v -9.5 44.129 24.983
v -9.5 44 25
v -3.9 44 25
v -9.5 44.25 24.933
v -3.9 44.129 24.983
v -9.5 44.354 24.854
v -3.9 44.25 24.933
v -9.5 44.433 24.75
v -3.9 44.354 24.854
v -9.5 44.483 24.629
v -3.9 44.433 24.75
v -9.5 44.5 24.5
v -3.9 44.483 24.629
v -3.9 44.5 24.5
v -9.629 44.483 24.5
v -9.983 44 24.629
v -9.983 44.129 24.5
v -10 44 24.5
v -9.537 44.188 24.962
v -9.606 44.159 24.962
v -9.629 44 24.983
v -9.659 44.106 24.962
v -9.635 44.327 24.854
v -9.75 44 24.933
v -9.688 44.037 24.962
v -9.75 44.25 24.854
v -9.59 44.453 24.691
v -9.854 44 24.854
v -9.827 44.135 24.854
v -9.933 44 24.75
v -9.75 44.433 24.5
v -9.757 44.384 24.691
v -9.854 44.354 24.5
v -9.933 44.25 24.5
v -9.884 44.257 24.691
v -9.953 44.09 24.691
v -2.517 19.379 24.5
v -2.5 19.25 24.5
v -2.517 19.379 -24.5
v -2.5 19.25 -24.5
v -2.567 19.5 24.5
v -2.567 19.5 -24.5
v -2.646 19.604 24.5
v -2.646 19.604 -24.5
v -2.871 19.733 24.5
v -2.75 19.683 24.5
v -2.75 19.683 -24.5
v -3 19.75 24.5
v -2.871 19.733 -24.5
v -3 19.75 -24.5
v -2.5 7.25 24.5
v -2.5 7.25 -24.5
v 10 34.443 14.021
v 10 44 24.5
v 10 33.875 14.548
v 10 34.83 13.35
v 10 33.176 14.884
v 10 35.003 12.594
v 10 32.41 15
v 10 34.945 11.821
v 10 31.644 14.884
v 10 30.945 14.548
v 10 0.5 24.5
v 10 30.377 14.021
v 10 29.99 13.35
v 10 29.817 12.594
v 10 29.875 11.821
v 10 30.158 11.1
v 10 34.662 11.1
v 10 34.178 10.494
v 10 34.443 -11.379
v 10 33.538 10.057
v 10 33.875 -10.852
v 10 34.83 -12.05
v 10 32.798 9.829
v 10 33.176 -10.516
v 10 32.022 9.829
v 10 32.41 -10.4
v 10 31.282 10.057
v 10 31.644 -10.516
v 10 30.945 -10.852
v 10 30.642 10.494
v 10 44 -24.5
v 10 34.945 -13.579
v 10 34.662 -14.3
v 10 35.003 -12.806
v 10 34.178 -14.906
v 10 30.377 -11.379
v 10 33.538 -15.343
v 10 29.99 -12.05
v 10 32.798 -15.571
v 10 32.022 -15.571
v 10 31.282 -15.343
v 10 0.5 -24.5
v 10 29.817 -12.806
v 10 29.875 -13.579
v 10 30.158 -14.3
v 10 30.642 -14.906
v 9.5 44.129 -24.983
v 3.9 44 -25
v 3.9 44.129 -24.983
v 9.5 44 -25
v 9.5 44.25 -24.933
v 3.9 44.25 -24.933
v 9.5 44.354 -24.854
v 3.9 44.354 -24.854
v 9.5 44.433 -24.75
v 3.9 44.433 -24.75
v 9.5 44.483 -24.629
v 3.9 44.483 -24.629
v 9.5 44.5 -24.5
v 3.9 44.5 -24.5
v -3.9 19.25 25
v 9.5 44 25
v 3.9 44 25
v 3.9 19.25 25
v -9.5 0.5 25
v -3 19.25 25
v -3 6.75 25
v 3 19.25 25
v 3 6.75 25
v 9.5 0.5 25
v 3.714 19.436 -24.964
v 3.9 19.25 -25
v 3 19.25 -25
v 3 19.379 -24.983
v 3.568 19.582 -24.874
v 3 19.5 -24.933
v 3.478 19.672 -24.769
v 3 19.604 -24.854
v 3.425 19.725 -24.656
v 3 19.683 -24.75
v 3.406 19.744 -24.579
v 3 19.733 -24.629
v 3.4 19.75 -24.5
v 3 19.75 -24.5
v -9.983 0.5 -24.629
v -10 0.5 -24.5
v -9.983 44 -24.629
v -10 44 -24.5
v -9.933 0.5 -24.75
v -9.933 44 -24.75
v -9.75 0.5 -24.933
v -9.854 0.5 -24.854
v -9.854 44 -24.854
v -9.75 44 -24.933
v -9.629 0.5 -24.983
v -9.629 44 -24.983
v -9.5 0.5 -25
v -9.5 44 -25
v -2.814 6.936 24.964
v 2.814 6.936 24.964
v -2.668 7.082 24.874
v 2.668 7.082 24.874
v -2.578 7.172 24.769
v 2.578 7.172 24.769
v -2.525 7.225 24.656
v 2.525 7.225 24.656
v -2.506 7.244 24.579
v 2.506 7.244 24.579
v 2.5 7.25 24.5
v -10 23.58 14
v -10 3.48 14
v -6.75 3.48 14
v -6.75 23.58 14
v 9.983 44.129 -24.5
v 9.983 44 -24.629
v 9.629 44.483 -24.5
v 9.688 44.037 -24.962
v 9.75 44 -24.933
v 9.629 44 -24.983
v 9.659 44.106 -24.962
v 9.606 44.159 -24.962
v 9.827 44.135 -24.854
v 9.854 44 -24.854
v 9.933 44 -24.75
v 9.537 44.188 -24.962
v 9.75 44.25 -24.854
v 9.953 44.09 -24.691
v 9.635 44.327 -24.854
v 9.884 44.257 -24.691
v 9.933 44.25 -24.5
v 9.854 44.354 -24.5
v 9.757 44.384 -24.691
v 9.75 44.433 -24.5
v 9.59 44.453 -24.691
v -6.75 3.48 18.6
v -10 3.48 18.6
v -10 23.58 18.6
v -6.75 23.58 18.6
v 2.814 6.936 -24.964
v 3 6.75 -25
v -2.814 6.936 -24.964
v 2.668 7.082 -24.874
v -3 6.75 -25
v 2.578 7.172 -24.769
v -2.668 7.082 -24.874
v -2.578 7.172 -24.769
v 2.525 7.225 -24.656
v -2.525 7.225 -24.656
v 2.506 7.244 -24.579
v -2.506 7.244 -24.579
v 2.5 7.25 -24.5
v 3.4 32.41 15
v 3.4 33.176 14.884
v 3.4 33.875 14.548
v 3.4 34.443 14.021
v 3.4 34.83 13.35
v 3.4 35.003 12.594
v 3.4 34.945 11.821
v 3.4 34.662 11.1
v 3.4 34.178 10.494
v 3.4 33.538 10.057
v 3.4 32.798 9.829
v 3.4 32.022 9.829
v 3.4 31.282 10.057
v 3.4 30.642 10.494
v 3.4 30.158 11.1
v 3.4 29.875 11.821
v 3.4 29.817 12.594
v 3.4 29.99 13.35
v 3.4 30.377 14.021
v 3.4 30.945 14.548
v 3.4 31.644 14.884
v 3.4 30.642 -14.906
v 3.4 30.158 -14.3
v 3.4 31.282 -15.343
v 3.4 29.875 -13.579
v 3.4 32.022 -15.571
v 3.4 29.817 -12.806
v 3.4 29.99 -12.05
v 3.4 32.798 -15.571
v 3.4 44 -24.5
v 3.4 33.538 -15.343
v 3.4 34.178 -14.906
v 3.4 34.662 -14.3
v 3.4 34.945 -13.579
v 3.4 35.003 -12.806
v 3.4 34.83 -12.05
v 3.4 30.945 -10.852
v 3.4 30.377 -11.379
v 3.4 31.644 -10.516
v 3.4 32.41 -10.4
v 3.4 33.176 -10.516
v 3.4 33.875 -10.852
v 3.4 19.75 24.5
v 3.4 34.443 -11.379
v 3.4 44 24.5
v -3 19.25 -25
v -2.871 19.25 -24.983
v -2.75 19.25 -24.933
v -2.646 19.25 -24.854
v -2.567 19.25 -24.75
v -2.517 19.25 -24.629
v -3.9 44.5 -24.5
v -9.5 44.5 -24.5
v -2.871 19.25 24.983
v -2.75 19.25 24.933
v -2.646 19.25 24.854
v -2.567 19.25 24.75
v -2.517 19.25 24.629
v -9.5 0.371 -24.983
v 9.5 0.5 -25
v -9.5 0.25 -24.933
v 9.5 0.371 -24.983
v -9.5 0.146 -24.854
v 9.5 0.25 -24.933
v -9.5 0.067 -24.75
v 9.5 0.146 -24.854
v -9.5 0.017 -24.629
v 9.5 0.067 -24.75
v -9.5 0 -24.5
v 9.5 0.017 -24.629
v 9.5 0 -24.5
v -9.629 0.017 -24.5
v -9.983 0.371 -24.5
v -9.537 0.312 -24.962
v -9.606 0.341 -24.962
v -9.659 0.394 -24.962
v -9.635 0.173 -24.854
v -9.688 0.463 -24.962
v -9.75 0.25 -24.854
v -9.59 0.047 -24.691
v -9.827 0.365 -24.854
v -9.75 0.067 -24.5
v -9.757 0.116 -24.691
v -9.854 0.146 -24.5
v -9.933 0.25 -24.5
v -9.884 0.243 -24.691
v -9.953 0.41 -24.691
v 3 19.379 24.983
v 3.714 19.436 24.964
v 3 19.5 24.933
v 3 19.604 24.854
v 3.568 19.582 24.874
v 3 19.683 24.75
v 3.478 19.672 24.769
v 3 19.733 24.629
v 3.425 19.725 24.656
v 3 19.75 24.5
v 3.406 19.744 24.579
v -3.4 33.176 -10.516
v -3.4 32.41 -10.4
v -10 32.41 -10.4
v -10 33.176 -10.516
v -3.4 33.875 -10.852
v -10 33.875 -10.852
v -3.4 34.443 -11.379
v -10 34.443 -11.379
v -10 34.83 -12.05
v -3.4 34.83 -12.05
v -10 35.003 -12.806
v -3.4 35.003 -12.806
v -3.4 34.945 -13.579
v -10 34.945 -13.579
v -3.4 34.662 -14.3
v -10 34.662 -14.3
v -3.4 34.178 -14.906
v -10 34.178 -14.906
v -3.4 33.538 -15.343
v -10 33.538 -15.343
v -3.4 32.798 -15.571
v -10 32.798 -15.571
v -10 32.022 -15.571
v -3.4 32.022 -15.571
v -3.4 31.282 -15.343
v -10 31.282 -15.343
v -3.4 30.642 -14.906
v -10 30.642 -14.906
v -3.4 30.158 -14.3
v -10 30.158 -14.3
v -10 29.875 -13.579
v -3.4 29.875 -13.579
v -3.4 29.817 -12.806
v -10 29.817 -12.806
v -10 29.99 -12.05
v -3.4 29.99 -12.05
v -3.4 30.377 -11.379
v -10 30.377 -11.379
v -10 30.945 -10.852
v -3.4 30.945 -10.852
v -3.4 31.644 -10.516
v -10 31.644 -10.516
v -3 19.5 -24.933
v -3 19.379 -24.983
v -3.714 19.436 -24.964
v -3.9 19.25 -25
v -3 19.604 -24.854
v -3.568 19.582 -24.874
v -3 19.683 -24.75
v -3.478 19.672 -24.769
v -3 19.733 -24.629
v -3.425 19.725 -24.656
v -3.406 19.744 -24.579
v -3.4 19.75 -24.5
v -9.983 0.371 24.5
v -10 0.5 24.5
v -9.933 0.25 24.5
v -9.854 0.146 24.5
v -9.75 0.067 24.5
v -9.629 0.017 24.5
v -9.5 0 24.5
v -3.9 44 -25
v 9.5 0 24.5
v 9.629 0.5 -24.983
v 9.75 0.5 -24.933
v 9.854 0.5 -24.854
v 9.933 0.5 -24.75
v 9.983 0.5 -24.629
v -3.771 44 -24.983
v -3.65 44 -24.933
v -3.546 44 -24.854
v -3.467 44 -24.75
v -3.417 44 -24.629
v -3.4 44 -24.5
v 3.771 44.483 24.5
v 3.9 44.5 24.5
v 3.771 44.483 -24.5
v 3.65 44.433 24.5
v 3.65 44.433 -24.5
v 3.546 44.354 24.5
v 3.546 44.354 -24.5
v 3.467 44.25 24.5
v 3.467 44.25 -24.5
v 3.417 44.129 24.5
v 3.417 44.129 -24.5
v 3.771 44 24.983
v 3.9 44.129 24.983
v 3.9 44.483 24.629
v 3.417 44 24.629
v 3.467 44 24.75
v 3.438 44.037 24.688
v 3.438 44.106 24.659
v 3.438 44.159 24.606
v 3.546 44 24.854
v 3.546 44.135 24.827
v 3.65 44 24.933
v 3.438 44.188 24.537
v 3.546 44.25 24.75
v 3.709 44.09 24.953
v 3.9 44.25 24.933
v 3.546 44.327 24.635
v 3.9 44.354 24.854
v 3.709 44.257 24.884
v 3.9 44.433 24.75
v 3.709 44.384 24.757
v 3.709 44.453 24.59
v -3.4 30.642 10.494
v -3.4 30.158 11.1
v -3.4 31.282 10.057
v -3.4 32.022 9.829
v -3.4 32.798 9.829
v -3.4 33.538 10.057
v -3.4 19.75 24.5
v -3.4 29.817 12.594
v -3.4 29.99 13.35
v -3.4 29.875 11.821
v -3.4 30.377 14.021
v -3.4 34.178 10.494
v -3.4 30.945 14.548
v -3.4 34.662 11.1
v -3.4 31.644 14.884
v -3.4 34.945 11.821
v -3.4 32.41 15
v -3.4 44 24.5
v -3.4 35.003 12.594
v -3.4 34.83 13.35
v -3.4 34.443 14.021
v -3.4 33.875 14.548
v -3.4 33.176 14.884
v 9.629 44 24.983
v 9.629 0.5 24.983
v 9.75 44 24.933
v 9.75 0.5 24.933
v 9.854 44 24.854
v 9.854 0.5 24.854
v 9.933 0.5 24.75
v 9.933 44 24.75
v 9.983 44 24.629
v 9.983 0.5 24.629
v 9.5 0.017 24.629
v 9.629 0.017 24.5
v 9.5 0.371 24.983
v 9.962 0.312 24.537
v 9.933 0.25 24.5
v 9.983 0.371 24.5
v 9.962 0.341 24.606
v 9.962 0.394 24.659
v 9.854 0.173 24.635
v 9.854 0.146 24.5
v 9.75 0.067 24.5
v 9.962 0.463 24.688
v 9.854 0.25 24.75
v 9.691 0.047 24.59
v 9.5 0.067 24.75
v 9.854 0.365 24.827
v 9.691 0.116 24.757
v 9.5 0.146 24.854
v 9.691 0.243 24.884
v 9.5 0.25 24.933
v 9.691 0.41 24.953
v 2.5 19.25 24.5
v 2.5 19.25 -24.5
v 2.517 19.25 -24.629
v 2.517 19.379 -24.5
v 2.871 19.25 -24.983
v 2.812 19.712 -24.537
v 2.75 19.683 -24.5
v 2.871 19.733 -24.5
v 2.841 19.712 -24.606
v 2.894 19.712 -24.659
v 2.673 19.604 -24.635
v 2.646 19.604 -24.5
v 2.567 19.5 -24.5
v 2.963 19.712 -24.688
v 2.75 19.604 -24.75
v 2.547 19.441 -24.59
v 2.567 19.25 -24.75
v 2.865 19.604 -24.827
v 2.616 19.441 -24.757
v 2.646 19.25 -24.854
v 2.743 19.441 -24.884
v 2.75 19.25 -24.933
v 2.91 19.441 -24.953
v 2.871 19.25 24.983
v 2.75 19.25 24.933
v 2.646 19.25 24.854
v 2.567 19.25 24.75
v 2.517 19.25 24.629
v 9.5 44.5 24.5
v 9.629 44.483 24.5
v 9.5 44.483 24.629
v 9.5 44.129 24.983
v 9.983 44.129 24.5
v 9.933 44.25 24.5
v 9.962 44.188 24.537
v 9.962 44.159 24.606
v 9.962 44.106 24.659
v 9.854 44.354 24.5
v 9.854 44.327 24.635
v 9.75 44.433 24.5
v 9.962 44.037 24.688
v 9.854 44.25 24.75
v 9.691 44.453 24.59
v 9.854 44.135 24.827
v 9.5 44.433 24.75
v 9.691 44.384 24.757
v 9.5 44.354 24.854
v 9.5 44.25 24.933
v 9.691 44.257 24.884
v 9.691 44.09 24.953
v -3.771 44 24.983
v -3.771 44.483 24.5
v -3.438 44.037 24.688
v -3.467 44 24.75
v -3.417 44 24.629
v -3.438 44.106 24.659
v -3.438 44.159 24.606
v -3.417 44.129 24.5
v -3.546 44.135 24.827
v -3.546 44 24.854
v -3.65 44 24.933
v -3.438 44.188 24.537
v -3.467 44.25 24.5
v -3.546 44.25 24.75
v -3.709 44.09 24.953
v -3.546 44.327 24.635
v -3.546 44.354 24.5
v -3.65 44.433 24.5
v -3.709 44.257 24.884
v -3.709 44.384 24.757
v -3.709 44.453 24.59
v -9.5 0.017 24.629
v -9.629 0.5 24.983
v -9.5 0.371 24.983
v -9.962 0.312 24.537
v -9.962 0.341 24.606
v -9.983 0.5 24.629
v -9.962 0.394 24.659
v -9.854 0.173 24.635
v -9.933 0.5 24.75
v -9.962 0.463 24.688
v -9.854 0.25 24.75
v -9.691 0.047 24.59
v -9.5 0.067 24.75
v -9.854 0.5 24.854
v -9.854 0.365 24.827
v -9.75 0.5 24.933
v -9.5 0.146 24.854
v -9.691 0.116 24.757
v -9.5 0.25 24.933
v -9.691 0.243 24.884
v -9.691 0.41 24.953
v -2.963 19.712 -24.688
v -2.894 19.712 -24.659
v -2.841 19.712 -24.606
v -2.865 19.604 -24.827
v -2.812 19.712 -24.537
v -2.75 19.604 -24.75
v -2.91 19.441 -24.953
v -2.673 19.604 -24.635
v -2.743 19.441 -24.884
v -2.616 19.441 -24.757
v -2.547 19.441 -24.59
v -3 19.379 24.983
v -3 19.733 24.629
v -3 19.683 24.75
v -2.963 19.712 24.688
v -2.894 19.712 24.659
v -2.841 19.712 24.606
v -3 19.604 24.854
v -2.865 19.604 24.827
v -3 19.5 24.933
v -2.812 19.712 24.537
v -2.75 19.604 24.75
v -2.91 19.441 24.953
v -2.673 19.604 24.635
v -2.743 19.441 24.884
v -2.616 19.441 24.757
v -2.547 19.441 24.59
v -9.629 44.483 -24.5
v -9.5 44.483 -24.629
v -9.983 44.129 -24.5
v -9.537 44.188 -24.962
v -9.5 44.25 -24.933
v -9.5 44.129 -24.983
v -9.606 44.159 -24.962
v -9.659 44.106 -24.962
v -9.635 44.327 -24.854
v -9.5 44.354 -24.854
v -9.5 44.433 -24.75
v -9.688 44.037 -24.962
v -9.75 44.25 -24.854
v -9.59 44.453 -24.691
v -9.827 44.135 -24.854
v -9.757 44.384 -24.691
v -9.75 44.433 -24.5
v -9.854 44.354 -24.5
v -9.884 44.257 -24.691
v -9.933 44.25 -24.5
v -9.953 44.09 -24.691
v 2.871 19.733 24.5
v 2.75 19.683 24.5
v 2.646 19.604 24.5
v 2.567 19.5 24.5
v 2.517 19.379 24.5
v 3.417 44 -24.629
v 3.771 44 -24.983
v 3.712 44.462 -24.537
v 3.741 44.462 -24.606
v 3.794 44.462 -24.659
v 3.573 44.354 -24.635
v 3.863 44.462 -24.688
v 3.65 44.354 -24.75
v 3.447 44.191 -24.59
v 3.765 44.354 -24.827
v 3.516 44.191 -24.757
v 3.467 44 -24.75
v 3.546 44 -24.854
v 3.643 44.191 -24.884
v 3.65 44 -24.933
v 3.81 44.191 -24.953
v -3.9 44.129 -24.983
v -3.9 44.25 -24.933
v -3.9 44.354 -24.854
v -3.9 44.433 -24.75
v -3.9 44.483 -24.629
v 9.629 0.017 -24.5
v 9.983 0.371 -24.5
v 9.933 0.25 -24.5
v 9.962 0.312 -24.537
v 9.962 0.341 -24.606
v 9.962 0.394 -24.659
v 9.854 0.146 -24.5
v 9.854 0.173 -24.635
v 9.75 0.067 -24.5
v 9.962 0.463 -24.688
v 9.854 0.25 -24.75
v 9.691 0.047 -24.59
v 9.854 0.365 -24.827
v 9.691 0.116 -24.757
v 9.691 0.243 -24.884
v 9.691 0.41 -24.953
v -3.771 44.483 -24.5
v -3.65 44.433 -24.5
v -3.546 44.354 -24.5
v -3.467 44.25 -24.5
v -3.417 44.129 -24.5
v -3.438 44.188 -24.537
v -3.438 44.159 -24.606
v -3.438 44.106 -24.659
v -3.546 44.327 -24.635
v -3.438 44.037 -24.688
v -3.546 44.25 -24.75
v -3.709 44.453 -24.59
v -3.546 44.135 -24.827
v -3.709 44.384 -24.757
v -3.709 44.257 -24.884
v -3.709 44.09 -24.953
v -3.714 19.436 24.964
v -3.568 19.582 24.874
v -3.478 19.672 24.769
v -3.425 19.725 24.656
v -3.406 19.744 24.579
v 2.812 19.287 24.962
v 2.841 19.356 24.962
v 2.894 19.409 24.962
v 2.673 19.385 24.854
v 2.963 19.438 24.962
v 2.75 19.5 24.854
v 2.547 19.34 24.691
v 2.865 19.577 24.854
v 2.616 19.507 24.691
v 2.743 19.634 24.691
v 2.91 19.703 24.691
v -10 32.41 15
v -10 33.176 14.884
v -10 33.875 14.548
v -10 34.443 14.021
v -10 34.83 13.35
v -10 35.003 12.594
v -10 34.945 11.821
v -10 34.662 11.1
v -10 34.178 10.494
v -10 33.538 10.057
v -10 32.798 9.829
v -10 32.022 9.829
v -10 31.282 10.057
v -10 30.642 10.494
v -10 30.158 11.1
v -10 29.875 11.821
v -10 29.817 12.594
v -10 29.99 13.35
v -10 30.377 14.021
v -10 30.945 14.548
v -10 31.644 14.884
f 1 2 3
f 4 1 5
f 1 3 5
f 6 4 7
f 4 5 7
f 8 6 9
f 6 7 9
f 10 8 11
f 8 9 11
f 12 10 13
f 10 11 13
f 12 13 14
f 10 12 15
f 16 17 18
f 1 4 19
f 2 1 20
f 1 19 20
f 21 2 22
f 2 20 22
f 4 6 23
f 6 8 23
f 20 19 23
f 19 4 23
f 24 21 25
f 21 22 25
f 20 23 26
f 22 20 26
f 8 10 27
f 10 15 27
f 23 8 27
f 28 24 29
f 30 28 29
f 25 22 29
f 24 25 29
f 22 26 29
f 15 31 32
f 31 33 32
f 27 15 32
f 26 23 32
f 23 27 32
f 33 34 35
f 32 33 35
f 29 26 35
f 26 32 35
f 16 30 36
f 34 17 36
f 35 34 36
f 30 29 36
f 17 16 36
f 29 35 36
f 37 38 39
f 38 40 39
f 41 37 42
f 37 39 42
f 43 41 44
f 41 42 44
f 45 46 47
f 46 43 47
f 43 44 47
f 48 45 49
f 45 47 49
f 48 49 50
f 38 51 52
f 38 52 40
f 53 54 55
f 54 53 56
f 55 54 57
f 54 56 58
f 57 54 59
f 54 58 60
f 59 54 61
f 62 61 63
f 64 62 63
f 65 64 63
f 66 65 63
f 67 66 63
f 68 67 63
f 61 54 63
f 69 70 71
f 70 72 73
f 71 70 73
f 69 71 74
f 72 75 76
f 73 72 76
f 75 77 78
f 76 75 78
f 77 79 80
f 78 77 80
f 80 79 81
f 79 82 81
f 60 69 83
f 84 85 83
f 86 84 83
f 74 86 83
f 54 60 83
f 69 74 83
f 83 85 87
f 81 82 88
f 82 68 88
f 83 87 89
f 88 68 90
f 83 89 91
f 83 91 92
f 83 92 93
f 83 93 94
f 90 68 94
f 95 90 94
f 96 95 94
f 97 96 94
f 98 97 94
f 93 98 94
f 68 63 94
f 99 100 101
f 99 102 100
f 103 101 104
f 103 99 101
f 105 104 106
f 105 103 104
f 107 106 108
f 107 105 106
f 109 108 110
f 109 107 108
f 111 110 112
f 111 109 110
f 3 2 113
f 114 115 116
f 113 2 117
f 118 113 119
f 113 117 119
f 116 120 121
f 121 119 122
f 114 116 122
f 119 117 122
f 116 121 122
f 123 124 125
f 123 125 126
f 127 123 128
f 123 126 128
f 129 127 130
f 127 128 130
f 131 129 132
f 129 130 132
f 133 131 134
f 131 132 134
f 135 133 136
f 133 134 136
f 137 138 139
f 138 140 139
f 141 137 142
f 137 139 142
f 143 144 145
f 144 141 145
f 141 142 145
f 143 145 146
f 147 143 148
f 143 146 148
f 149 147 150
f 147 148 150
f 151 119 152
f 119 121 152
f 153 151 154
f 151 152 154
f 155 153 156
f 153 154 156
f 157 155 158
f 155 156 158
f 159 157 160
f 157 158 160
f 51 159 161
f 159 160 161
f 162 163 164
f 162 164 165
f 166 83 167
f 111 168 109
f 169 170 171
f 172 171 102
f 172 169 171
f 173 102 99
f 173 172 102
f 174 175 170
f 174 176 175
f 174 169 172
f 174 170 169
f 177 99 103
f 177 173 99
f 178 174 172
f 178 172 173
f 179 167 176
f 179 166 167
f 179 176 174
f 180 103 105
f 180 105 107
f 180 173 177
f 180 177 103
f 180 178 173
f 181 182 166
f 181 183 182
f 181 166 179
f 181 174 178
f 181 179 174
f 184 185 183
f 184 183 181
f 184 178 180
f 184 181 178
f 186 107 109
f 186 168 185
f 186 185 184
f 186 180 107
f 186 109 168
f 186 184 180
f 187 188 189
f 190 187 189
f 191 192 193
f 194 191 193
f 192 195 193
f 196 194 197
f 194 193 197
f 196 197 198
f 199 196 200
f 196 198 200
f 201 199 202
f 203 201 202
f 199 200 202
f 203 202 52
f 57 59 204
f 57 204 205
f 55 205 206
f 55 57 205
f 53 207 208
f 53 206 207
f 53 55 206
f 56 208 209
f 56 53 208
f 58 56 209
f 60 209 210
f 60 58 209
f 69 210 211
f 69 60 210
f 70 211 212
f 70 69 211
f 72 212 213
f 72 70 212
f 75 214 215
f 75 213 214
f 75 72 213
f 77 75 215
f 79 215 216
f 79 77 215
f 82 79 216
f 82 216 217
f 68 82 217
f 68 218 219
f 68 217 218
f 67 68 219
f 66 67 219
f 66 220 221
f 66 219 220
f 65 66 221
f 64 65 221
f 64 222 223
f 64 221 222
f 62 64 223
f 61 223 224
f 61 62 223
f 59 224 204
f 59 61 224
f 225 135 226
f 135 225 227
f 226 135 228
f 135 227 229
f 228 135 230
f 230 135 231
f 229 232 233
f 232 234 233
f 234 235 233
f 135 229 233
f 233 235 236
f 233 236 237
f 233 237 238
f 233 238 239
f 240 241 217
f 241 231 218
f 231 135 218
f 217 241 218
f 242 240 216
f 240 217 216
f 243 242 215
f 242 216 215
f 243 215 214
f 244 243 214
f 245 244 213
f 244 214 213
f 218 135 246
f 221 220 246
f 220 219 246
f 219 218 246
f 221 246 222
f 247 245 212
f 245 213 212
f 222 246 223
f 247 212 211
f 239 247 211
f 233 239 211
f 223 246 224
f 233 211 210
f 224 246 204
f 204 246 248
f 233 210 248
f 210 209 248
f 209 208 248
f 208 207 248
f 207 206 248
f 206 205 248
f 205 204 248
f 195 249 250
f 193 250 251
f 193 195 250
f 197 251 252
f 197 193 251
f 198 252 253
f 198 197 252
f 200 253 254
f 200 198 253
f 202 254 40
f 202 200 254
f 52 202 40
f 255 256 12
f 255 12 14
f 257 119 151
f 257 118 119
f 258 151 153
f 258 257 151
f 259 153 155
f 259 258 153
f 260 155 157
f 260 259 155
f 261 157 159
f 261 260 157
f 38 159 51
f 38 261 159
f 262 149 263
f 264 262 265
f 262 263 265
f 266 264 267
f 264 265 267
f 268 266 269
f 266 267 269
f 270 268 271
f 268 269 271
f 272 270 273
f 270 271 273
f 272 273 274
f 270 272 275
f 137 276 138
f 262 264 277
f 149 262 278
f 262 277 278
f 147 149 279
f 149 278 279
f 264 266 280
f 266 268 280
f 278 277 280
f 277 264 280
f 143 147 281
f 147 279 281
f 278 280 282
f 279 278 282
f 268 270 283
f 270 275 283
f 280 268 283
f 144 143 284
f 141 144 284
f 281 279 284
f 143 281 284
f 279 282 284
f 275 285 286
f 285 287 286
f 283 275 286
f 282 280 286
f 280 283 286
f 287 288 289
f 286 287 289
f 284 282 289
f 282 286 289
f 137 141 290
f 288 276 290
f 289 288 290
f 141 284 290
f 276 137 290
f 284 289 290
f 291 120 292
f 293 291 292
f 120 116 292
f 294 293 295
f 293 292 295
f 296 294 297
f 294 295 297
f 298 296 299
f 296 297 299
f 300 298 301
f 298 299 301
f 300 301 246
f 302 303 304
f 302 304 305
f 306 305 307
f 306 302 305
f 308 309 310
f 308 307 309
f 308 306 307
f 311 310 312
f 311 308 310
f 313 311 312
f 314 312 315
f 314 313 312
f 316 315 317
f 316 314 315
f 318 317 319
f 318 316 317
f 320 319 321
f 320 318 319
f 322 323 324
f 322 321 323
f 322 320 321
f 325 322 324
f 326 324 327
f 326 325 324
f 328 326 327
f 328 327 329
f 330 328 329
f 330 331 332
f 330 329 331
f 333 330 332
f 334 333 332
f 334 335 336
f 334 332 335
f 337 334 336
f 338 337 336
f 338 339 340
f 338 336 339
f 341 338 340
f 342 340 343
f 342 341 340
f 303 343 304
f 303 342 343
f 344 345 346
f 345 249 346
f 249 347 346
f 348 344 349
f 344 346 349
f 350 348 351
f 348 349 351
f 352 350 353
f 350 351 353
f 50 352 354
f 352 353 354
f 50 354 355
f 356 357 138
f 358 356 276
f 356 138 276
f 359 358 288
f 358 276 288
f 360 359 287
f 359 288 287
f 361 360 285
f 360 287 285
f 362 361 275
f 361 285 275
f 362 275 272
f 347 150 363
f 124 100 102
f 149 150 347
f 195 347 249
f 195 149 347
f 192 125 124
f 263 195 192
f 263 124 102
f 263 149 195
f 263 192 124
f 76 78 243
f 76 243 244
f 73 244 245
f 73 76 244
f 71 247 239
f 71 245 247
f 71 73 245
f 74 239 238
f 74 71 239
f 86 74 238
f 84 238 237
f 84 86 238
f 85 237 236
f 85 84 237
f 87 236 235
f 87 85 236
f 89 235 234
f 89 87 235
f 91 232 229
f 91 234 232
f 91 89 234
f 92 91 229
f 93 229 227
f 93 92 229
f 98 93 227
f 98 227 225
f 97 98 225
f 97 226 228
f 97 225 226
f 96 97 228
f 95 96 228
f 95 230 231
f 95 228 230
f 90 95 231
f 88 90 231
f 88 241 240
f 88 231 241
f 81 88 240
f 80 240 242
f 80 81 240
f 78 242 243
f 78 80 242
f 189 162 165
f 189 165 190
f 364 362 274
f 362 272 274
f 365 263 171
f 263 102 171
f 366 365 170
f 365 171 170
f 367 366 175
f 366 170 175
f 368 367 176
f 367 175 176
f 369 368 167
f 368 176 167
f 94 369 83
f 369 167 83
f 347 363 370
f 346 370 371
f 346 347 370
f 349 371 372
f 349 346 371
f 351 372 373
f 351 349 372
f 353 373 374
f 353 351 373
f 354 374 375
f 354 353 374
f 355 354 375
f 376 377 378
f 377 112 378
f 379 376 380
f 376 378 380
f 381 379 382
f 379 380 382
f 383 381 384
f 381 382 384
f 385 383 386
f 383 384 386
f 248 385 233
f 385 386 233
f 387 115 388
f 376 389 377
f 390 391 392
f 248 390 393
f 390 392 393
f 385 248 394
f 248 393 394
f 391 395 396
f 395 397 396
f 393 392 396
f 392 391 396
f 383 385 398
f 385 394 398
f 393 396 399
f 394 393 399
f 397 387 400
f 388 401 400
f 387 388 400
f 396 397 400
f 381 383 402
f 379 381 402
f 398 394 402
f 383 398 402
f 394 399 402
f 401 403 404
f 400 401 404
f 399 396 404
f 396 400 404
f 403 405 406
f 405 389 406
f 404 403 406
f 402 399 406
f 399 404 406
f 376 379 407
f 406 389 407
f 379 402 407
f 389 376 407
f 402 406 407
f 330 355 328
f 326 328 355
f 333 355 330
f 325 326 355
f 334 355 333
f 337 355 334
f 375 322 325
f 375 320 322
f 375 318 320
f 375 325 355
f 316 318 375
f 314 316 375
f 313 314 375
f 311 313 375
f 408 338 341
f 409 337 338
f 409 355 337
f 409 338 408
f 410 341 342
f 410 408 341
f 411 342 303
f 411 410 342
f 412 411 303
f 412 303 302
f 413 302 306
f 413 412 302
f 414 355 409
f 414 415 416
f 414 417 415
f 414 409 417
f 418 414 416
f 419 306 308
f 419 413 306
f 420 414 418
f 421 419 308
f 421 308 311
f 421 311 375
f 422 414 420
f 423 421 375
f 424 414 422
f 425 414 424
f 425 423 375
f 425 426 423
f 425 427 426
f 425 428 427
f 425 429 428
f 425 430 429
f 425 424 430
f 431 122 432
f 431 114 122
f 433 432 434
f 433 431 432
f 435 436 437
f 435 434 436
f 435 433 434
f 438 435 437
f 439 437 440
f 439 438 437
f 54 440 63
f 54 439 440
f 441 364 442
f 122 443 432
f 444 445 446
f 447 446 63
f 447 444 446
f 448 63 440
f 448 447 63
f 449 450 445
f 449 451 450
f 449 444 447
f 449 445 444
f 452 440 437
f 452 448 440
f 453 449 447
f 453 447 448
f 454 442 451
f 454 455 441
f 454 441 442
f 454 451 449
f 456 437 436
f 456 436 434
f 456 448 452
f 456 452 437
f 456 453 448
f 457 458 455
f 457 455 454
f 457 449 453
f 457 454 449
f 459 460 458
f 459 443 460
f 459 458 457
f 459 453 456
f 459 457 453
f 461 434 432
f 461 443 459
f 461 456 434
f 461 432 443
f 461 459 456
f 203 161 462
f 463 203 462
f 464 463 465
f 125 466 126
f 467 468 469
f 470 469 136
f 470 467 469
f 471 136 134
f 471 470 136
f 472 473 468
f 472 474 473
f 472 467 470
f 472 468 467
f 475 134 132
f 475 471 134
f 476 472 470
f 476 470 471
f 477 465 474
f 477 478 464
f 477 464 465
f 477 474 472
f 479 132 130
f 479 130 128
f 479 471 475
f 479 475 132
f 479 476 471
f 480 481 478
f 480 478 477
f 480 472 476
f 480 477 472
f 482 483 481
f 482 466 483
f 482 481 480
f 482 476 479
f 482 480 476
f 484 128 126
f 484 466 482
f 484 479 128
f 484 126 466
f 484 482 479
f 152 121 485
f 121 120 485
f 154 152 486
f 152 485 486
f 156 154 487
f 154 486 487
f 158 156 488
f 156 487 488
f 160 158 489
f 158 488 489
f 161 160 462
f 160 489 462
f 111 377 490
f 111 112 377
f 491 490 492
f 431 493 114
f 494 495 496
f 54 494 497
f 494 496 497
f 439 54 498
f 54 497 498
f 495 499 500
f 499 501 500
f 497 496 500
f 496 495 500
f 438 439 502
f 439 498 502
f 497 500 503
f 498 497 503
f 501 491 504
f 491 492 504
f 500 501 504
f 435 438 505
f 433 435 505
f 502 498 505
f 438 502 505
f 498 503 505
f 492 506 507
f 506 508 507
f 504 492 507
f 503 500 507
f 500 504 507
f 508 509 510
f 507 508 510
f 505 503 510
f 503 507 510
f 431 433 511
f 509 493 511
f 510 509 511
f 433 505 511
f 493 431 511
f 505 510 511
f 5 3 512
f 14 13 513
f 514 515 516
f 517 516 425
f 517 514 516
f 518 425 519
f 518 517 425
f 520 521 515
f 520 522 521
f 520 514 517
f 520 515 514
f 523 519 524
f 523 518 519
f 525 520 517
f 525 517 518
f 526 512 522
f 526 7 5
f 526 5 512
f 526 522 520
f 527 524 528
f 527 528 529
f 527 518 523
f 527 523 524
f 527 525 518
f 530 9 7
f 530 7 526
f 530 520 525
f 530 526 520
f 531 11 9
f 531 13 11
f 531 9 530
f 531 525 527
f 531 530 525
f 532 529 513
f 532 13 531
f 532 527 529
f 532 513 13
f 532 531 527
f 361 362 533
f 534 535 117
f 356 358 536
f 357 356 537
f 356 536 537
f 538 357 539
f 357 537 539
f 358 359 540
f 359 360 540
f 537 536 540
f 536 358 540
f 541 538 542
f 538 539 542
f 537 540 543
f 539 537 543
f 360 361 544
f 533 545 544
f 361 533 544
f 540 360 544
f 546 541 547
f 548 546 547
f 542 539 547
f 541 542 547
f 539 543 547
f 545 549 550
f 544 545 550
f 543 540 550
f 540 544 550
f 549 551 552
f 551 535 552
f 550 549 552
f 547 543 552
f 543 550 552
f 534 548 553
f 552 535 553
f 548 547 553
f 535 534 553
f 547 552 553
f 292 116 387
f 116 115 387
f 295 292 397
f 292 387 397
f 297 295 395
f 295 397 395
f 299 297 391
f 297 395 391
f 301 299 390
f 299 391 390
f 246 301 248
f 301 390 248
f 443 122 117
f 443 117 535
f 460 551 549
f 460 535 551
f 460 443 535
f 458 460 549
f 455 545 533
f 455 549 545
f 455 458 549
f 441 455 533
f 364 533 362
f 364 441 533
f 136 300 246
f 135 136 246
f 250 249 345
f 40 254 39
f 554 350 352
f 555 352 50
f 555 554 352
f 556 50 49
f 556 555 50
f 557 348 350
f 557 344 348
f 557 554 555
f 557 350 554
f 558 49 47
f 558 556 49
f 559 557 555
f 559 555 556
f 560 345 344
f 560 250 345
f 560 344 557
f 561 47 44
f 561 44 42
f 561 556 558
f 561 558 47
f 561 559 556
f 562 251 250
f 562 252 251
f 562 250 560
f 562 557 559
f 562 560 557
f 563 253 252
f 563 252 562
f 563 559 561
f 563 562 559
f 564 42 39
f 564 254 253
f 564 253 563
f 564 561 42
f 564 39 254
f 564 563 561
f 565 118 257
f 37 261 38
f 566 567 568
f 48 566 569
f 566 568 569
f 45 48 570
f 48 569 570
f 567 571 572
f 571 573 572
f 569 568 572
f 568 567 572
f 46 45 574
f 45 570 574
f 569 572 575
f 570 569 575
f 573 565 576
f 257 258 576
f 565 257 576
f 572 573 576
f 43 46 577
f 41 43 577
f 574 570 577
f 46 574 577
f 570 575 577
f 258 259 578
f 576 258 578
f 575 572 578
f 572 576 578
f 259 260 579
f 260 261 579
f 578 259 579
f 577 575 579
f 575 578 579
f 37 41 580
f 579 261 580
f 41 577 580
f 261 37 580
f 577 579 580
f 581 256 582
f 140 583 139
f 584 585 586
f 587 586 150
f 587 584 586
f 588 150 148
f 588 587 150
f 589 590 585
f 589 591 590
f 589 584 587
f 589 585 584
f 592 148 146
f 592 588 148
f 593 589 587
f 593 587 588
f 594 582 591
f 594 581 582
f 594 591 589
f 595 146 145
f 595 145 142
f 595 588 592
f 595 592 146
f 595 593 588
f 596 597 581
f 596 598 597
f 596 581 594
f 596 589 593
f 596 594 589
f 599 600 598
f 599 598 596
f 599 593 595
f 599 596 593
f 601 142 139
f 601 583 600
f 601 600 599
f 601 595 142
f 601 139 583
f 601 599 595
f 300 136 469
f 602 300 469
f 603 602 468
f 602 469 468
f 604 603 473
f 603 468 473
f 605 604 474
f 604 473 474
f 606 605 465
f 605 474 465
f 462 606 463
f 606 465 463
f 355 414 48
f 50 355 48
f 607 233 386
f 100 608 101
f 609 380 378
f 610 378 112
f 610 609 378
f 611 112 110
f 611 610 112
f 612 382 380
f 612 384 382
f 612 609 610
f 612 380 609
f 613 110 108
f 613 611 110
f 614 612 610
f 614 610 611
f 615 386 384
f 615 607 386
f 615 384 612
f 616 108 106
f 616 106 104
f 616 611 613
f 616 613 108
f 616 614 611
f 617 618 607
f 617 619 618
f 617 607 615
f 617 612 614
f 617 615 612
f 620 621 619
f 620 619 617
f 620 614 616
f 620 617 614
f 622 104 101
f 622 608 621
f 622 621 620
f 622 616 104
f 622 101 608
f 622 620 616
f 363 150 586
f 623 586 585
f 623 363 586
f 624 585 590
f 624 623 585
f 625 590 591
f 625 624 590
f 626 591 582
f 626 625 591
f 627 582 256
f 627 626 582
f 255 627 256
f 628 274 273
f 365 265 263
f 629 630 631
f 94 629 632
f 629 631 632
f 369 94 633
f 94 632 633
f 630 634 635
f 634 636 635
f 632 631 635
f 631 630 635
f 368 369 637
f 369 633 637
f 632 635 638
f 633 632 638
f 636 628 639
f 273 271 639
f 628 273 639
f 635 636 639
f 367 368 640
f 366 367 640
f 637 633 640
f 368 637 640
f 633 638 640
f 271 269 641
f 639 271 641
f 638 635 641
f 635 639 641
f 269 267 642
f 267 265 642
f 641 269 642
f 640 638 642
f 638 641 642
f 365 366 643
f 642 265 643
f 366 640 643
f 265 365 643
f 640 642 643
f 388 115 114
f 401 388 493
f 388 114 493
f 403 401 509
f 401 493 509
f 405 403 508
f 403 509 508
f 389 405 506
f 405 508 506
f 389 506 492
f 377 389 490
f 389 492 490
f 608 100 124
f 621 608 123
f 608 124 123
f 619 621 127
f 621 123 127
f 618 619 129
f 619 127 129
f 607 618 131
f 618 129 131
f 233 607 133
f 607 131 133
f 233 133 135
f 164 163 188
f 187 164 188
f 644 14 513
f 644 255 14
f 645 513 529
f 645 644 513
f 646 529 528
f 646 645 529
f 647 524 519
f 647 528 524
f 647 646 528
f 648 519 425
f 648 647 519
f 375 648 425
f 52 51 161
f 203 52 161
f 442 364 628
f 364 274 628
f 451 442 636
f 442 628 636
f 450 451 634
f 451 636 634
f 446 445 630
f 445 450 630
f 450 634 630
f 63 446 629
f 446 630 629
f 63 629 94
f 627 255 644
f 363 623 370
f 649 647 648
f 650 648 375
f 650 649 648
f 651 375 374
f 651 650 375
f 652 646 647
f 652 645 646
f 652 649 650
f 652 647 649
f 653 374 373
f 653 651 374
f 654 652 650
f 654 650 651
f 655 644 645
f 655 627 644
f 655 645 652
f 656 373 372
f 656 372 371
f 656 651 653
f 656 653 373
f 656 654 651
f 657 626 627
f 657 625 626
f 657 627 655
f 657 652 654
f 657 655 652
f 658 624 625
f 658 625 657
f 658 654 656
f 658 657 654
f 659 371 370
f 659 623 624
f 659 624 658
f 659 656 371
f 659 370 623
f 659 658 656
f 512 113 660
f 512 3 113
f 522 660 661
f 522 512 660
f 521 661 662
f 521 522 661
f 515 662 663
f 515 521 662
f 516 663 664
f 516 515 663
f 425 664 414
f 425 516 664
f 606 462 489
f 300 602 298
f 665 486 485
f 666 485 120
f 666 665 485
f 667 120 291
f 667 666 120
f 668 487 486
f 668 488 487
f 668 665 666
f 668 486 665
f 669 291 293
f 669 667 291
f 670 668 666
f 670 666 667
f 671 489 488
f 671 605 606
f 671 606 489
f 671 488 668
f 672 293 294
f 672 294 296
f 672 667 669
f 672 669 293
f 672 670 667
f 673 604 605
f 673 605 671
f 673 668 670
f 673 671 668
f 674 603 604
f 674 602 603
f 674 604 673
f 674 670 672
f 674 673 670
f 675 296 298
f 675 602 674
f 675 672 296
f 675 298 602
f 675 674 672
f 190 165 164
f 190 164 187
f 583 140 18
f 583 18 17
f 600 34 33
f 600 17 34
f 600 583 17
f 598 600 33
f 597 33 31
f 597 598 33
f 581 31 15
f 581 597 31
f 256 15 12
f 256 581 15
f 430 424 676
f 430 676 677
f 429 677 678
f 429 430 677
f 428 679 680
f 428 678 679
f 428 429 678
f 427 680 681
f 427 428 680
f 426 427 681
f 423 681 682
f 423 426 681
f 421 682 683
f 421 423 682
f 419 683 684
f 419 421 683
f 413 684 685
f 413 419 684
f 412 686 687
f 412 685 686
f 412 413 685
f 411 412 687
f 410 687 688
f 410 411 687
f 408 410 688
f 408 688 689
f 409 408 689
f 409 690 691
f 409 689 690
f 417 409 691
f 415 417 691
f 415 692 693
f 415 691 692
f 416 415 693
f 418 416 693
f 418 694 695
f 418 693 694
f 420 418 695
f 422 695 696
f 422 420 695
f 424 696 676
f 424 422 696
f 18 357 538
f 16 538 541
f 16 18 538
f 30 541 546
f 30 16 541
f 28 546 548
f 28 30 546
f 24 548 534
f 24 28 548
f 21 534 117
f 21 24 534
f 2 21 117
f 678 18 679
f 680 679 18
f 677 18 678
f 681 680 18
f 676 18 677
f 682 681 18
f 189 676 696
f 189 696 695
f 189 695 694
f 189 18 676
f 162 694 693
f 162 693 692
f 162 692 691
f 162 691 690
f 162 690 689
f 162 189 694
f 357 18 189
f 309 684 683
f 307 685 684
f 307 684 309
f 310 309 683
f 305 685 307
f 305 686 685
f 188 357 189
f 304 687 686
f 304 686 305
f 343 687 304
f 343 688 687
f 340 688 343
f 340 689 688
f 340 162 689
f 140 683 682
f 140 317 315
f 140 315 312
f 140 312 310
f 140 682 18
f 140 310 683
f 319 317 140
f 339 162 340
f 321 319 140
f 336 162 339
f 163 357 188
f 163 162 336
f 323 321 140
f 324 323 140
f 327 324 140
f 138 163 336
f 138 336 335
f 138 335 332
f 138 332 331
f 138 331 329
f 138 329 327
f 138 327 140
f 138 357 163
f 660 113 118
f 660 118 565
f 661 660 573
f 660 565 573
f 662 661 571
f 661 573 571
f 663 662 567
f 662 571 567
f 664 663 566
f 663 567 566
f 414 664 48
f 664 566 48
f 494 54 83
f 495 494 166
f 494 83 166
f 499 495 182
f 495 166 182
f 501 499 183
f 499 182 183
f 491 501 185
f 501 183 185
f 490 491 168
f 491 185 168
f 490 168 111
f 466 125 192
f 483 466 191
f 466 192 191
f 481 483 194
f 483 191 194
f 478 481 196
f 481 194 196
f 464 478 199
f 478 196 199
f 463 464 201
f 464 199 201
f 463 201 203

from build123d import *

# Parameters (mm, degrees)
SKETCH2_W               = 20
SKETCH2_H               = 50
BOSS_EXTRUDE1_DEPTH     = 44.5
SKETCH3_W               = 6.8
SKETCH3_H               = 24.75
SKETCH3_W_2             = 5
SKETCH3_H_2             = 12.5
CUT_EXTRUDE3_DEPTH      = 68.677544282
FILLET1_R               = 0.5
SKETCH7_W               = 4.6
SKETCH7_H               = 20.1
CUT_EXTRUDE4_DEPTH      = 3.25
CUT_EXTRUDE5_DEPTH      = 55.820160525
CUT_EXTRUDE5_DEPTH_BACK = 55.820160525
SKETCH8_R               = 2.6


with BuildPart() as part:
    # Sketch2 → Boss-Extrude1 (new body)
    with BuildSketch(Plane(origin=(0, 0, 0), x_dir=(1, 0, 0), z_dir=(0, 1, 0))):
        Rectangle(SKETCH2_W, SKETCH2_H)
    extrude(amount=BOSS_EXTRUDE1_DEPTH)

    # Sketch3 → Cut-Extrude3 (cut, through all)
    with BuildSketch(Plane.XY.offset(25)):
        with Locations((0, 32.125)):
            Rectangle(SKETCH3_W, SKETCH3_H)
        with Locations((0, 13.5)):
            Rectangle(SKETCH3_W_2, SKETCH3_H_2)
    extrude(amount=-CUT_EXTRUDE3_DEPTH, mode=Mode.SUBTRACT)

    # Fillet1
    fillet1_edges = [part.edges().sort_by_distance(p)[0] for p in [
        (-10, 44.5, 0),
        (-6.7, 44.5, -25),
        (6.7, 44.5, 25),
        (-6.7, 44.5, 25),
        (0, 7.25, -25),
        (-2.5, 13.5, 25),
        (2.5, 13.5, -25),
        (2.5, 19.75, 0),
        (-2.5, 13.5, -25),
        (3.4, 32.125, -25),
        (0, 7.25, 25),
        (2.5, 13.5, 25),
        (2.95, 19.75, 25),
        (-3.4, 32.125, 25),
        (-2.95, 19.75, 25),
        (-3.4, 44.5, 0),
        (3.4, 32.125, 25),
        (3.4, 44.5, 0),
        (-3.4, 32.125, -25),
        (-2.95, 19.75, -25),
        (-2.5, 19.75, 0),
        (2.95, 19.75, -25),
        (10, 44.5, 0),
        (0, 0, 25),
        (-10, 0, 0),
        (0, 0, -25),
        (10, 0, 0),
        (10, 22.25, 25),
        (-10, 22.25, 25),
        (-10, 22.25, -25),
        (10, 22.25, -25),
        (6.7, 44.5, -25),
    ]]
    fillet(fillet1_edges, radius=FILLET1_R)

    # Sketch7 → Cut-Extrude4 (cut)
    with BuildSketch(Plane.ZY.offset(10)):
        with Locations((16.3, 13.53)):
            Rectangle(SKETCH7_W, SKETCH7_H)
    extrude(amount=-CUT_EXTRUDE4_DEPTH, mode=Mode.SUBTRACT)

    # Sketch8 → Cut-Extrude5 (cut, two sides: drawn at the far end of the back side and taken through both)
    with BuildSketch(Plane.ZY.offset(10).offset(-CUT_EXTRUDE5_DEPTH_BACK)):
        with Locations((-13, 32.41)):
            Circle(SKETCH8_R)
        with Locations((12.4, 32.41)):
            Circle(SKETCH8_R)
    extrude(amount=CUT_EXTRUDE5_DEPTH + CUT_EXTRUDE5_DEPTH_BACK, mode=Mode.SUBTRACT)


solid = part.part
